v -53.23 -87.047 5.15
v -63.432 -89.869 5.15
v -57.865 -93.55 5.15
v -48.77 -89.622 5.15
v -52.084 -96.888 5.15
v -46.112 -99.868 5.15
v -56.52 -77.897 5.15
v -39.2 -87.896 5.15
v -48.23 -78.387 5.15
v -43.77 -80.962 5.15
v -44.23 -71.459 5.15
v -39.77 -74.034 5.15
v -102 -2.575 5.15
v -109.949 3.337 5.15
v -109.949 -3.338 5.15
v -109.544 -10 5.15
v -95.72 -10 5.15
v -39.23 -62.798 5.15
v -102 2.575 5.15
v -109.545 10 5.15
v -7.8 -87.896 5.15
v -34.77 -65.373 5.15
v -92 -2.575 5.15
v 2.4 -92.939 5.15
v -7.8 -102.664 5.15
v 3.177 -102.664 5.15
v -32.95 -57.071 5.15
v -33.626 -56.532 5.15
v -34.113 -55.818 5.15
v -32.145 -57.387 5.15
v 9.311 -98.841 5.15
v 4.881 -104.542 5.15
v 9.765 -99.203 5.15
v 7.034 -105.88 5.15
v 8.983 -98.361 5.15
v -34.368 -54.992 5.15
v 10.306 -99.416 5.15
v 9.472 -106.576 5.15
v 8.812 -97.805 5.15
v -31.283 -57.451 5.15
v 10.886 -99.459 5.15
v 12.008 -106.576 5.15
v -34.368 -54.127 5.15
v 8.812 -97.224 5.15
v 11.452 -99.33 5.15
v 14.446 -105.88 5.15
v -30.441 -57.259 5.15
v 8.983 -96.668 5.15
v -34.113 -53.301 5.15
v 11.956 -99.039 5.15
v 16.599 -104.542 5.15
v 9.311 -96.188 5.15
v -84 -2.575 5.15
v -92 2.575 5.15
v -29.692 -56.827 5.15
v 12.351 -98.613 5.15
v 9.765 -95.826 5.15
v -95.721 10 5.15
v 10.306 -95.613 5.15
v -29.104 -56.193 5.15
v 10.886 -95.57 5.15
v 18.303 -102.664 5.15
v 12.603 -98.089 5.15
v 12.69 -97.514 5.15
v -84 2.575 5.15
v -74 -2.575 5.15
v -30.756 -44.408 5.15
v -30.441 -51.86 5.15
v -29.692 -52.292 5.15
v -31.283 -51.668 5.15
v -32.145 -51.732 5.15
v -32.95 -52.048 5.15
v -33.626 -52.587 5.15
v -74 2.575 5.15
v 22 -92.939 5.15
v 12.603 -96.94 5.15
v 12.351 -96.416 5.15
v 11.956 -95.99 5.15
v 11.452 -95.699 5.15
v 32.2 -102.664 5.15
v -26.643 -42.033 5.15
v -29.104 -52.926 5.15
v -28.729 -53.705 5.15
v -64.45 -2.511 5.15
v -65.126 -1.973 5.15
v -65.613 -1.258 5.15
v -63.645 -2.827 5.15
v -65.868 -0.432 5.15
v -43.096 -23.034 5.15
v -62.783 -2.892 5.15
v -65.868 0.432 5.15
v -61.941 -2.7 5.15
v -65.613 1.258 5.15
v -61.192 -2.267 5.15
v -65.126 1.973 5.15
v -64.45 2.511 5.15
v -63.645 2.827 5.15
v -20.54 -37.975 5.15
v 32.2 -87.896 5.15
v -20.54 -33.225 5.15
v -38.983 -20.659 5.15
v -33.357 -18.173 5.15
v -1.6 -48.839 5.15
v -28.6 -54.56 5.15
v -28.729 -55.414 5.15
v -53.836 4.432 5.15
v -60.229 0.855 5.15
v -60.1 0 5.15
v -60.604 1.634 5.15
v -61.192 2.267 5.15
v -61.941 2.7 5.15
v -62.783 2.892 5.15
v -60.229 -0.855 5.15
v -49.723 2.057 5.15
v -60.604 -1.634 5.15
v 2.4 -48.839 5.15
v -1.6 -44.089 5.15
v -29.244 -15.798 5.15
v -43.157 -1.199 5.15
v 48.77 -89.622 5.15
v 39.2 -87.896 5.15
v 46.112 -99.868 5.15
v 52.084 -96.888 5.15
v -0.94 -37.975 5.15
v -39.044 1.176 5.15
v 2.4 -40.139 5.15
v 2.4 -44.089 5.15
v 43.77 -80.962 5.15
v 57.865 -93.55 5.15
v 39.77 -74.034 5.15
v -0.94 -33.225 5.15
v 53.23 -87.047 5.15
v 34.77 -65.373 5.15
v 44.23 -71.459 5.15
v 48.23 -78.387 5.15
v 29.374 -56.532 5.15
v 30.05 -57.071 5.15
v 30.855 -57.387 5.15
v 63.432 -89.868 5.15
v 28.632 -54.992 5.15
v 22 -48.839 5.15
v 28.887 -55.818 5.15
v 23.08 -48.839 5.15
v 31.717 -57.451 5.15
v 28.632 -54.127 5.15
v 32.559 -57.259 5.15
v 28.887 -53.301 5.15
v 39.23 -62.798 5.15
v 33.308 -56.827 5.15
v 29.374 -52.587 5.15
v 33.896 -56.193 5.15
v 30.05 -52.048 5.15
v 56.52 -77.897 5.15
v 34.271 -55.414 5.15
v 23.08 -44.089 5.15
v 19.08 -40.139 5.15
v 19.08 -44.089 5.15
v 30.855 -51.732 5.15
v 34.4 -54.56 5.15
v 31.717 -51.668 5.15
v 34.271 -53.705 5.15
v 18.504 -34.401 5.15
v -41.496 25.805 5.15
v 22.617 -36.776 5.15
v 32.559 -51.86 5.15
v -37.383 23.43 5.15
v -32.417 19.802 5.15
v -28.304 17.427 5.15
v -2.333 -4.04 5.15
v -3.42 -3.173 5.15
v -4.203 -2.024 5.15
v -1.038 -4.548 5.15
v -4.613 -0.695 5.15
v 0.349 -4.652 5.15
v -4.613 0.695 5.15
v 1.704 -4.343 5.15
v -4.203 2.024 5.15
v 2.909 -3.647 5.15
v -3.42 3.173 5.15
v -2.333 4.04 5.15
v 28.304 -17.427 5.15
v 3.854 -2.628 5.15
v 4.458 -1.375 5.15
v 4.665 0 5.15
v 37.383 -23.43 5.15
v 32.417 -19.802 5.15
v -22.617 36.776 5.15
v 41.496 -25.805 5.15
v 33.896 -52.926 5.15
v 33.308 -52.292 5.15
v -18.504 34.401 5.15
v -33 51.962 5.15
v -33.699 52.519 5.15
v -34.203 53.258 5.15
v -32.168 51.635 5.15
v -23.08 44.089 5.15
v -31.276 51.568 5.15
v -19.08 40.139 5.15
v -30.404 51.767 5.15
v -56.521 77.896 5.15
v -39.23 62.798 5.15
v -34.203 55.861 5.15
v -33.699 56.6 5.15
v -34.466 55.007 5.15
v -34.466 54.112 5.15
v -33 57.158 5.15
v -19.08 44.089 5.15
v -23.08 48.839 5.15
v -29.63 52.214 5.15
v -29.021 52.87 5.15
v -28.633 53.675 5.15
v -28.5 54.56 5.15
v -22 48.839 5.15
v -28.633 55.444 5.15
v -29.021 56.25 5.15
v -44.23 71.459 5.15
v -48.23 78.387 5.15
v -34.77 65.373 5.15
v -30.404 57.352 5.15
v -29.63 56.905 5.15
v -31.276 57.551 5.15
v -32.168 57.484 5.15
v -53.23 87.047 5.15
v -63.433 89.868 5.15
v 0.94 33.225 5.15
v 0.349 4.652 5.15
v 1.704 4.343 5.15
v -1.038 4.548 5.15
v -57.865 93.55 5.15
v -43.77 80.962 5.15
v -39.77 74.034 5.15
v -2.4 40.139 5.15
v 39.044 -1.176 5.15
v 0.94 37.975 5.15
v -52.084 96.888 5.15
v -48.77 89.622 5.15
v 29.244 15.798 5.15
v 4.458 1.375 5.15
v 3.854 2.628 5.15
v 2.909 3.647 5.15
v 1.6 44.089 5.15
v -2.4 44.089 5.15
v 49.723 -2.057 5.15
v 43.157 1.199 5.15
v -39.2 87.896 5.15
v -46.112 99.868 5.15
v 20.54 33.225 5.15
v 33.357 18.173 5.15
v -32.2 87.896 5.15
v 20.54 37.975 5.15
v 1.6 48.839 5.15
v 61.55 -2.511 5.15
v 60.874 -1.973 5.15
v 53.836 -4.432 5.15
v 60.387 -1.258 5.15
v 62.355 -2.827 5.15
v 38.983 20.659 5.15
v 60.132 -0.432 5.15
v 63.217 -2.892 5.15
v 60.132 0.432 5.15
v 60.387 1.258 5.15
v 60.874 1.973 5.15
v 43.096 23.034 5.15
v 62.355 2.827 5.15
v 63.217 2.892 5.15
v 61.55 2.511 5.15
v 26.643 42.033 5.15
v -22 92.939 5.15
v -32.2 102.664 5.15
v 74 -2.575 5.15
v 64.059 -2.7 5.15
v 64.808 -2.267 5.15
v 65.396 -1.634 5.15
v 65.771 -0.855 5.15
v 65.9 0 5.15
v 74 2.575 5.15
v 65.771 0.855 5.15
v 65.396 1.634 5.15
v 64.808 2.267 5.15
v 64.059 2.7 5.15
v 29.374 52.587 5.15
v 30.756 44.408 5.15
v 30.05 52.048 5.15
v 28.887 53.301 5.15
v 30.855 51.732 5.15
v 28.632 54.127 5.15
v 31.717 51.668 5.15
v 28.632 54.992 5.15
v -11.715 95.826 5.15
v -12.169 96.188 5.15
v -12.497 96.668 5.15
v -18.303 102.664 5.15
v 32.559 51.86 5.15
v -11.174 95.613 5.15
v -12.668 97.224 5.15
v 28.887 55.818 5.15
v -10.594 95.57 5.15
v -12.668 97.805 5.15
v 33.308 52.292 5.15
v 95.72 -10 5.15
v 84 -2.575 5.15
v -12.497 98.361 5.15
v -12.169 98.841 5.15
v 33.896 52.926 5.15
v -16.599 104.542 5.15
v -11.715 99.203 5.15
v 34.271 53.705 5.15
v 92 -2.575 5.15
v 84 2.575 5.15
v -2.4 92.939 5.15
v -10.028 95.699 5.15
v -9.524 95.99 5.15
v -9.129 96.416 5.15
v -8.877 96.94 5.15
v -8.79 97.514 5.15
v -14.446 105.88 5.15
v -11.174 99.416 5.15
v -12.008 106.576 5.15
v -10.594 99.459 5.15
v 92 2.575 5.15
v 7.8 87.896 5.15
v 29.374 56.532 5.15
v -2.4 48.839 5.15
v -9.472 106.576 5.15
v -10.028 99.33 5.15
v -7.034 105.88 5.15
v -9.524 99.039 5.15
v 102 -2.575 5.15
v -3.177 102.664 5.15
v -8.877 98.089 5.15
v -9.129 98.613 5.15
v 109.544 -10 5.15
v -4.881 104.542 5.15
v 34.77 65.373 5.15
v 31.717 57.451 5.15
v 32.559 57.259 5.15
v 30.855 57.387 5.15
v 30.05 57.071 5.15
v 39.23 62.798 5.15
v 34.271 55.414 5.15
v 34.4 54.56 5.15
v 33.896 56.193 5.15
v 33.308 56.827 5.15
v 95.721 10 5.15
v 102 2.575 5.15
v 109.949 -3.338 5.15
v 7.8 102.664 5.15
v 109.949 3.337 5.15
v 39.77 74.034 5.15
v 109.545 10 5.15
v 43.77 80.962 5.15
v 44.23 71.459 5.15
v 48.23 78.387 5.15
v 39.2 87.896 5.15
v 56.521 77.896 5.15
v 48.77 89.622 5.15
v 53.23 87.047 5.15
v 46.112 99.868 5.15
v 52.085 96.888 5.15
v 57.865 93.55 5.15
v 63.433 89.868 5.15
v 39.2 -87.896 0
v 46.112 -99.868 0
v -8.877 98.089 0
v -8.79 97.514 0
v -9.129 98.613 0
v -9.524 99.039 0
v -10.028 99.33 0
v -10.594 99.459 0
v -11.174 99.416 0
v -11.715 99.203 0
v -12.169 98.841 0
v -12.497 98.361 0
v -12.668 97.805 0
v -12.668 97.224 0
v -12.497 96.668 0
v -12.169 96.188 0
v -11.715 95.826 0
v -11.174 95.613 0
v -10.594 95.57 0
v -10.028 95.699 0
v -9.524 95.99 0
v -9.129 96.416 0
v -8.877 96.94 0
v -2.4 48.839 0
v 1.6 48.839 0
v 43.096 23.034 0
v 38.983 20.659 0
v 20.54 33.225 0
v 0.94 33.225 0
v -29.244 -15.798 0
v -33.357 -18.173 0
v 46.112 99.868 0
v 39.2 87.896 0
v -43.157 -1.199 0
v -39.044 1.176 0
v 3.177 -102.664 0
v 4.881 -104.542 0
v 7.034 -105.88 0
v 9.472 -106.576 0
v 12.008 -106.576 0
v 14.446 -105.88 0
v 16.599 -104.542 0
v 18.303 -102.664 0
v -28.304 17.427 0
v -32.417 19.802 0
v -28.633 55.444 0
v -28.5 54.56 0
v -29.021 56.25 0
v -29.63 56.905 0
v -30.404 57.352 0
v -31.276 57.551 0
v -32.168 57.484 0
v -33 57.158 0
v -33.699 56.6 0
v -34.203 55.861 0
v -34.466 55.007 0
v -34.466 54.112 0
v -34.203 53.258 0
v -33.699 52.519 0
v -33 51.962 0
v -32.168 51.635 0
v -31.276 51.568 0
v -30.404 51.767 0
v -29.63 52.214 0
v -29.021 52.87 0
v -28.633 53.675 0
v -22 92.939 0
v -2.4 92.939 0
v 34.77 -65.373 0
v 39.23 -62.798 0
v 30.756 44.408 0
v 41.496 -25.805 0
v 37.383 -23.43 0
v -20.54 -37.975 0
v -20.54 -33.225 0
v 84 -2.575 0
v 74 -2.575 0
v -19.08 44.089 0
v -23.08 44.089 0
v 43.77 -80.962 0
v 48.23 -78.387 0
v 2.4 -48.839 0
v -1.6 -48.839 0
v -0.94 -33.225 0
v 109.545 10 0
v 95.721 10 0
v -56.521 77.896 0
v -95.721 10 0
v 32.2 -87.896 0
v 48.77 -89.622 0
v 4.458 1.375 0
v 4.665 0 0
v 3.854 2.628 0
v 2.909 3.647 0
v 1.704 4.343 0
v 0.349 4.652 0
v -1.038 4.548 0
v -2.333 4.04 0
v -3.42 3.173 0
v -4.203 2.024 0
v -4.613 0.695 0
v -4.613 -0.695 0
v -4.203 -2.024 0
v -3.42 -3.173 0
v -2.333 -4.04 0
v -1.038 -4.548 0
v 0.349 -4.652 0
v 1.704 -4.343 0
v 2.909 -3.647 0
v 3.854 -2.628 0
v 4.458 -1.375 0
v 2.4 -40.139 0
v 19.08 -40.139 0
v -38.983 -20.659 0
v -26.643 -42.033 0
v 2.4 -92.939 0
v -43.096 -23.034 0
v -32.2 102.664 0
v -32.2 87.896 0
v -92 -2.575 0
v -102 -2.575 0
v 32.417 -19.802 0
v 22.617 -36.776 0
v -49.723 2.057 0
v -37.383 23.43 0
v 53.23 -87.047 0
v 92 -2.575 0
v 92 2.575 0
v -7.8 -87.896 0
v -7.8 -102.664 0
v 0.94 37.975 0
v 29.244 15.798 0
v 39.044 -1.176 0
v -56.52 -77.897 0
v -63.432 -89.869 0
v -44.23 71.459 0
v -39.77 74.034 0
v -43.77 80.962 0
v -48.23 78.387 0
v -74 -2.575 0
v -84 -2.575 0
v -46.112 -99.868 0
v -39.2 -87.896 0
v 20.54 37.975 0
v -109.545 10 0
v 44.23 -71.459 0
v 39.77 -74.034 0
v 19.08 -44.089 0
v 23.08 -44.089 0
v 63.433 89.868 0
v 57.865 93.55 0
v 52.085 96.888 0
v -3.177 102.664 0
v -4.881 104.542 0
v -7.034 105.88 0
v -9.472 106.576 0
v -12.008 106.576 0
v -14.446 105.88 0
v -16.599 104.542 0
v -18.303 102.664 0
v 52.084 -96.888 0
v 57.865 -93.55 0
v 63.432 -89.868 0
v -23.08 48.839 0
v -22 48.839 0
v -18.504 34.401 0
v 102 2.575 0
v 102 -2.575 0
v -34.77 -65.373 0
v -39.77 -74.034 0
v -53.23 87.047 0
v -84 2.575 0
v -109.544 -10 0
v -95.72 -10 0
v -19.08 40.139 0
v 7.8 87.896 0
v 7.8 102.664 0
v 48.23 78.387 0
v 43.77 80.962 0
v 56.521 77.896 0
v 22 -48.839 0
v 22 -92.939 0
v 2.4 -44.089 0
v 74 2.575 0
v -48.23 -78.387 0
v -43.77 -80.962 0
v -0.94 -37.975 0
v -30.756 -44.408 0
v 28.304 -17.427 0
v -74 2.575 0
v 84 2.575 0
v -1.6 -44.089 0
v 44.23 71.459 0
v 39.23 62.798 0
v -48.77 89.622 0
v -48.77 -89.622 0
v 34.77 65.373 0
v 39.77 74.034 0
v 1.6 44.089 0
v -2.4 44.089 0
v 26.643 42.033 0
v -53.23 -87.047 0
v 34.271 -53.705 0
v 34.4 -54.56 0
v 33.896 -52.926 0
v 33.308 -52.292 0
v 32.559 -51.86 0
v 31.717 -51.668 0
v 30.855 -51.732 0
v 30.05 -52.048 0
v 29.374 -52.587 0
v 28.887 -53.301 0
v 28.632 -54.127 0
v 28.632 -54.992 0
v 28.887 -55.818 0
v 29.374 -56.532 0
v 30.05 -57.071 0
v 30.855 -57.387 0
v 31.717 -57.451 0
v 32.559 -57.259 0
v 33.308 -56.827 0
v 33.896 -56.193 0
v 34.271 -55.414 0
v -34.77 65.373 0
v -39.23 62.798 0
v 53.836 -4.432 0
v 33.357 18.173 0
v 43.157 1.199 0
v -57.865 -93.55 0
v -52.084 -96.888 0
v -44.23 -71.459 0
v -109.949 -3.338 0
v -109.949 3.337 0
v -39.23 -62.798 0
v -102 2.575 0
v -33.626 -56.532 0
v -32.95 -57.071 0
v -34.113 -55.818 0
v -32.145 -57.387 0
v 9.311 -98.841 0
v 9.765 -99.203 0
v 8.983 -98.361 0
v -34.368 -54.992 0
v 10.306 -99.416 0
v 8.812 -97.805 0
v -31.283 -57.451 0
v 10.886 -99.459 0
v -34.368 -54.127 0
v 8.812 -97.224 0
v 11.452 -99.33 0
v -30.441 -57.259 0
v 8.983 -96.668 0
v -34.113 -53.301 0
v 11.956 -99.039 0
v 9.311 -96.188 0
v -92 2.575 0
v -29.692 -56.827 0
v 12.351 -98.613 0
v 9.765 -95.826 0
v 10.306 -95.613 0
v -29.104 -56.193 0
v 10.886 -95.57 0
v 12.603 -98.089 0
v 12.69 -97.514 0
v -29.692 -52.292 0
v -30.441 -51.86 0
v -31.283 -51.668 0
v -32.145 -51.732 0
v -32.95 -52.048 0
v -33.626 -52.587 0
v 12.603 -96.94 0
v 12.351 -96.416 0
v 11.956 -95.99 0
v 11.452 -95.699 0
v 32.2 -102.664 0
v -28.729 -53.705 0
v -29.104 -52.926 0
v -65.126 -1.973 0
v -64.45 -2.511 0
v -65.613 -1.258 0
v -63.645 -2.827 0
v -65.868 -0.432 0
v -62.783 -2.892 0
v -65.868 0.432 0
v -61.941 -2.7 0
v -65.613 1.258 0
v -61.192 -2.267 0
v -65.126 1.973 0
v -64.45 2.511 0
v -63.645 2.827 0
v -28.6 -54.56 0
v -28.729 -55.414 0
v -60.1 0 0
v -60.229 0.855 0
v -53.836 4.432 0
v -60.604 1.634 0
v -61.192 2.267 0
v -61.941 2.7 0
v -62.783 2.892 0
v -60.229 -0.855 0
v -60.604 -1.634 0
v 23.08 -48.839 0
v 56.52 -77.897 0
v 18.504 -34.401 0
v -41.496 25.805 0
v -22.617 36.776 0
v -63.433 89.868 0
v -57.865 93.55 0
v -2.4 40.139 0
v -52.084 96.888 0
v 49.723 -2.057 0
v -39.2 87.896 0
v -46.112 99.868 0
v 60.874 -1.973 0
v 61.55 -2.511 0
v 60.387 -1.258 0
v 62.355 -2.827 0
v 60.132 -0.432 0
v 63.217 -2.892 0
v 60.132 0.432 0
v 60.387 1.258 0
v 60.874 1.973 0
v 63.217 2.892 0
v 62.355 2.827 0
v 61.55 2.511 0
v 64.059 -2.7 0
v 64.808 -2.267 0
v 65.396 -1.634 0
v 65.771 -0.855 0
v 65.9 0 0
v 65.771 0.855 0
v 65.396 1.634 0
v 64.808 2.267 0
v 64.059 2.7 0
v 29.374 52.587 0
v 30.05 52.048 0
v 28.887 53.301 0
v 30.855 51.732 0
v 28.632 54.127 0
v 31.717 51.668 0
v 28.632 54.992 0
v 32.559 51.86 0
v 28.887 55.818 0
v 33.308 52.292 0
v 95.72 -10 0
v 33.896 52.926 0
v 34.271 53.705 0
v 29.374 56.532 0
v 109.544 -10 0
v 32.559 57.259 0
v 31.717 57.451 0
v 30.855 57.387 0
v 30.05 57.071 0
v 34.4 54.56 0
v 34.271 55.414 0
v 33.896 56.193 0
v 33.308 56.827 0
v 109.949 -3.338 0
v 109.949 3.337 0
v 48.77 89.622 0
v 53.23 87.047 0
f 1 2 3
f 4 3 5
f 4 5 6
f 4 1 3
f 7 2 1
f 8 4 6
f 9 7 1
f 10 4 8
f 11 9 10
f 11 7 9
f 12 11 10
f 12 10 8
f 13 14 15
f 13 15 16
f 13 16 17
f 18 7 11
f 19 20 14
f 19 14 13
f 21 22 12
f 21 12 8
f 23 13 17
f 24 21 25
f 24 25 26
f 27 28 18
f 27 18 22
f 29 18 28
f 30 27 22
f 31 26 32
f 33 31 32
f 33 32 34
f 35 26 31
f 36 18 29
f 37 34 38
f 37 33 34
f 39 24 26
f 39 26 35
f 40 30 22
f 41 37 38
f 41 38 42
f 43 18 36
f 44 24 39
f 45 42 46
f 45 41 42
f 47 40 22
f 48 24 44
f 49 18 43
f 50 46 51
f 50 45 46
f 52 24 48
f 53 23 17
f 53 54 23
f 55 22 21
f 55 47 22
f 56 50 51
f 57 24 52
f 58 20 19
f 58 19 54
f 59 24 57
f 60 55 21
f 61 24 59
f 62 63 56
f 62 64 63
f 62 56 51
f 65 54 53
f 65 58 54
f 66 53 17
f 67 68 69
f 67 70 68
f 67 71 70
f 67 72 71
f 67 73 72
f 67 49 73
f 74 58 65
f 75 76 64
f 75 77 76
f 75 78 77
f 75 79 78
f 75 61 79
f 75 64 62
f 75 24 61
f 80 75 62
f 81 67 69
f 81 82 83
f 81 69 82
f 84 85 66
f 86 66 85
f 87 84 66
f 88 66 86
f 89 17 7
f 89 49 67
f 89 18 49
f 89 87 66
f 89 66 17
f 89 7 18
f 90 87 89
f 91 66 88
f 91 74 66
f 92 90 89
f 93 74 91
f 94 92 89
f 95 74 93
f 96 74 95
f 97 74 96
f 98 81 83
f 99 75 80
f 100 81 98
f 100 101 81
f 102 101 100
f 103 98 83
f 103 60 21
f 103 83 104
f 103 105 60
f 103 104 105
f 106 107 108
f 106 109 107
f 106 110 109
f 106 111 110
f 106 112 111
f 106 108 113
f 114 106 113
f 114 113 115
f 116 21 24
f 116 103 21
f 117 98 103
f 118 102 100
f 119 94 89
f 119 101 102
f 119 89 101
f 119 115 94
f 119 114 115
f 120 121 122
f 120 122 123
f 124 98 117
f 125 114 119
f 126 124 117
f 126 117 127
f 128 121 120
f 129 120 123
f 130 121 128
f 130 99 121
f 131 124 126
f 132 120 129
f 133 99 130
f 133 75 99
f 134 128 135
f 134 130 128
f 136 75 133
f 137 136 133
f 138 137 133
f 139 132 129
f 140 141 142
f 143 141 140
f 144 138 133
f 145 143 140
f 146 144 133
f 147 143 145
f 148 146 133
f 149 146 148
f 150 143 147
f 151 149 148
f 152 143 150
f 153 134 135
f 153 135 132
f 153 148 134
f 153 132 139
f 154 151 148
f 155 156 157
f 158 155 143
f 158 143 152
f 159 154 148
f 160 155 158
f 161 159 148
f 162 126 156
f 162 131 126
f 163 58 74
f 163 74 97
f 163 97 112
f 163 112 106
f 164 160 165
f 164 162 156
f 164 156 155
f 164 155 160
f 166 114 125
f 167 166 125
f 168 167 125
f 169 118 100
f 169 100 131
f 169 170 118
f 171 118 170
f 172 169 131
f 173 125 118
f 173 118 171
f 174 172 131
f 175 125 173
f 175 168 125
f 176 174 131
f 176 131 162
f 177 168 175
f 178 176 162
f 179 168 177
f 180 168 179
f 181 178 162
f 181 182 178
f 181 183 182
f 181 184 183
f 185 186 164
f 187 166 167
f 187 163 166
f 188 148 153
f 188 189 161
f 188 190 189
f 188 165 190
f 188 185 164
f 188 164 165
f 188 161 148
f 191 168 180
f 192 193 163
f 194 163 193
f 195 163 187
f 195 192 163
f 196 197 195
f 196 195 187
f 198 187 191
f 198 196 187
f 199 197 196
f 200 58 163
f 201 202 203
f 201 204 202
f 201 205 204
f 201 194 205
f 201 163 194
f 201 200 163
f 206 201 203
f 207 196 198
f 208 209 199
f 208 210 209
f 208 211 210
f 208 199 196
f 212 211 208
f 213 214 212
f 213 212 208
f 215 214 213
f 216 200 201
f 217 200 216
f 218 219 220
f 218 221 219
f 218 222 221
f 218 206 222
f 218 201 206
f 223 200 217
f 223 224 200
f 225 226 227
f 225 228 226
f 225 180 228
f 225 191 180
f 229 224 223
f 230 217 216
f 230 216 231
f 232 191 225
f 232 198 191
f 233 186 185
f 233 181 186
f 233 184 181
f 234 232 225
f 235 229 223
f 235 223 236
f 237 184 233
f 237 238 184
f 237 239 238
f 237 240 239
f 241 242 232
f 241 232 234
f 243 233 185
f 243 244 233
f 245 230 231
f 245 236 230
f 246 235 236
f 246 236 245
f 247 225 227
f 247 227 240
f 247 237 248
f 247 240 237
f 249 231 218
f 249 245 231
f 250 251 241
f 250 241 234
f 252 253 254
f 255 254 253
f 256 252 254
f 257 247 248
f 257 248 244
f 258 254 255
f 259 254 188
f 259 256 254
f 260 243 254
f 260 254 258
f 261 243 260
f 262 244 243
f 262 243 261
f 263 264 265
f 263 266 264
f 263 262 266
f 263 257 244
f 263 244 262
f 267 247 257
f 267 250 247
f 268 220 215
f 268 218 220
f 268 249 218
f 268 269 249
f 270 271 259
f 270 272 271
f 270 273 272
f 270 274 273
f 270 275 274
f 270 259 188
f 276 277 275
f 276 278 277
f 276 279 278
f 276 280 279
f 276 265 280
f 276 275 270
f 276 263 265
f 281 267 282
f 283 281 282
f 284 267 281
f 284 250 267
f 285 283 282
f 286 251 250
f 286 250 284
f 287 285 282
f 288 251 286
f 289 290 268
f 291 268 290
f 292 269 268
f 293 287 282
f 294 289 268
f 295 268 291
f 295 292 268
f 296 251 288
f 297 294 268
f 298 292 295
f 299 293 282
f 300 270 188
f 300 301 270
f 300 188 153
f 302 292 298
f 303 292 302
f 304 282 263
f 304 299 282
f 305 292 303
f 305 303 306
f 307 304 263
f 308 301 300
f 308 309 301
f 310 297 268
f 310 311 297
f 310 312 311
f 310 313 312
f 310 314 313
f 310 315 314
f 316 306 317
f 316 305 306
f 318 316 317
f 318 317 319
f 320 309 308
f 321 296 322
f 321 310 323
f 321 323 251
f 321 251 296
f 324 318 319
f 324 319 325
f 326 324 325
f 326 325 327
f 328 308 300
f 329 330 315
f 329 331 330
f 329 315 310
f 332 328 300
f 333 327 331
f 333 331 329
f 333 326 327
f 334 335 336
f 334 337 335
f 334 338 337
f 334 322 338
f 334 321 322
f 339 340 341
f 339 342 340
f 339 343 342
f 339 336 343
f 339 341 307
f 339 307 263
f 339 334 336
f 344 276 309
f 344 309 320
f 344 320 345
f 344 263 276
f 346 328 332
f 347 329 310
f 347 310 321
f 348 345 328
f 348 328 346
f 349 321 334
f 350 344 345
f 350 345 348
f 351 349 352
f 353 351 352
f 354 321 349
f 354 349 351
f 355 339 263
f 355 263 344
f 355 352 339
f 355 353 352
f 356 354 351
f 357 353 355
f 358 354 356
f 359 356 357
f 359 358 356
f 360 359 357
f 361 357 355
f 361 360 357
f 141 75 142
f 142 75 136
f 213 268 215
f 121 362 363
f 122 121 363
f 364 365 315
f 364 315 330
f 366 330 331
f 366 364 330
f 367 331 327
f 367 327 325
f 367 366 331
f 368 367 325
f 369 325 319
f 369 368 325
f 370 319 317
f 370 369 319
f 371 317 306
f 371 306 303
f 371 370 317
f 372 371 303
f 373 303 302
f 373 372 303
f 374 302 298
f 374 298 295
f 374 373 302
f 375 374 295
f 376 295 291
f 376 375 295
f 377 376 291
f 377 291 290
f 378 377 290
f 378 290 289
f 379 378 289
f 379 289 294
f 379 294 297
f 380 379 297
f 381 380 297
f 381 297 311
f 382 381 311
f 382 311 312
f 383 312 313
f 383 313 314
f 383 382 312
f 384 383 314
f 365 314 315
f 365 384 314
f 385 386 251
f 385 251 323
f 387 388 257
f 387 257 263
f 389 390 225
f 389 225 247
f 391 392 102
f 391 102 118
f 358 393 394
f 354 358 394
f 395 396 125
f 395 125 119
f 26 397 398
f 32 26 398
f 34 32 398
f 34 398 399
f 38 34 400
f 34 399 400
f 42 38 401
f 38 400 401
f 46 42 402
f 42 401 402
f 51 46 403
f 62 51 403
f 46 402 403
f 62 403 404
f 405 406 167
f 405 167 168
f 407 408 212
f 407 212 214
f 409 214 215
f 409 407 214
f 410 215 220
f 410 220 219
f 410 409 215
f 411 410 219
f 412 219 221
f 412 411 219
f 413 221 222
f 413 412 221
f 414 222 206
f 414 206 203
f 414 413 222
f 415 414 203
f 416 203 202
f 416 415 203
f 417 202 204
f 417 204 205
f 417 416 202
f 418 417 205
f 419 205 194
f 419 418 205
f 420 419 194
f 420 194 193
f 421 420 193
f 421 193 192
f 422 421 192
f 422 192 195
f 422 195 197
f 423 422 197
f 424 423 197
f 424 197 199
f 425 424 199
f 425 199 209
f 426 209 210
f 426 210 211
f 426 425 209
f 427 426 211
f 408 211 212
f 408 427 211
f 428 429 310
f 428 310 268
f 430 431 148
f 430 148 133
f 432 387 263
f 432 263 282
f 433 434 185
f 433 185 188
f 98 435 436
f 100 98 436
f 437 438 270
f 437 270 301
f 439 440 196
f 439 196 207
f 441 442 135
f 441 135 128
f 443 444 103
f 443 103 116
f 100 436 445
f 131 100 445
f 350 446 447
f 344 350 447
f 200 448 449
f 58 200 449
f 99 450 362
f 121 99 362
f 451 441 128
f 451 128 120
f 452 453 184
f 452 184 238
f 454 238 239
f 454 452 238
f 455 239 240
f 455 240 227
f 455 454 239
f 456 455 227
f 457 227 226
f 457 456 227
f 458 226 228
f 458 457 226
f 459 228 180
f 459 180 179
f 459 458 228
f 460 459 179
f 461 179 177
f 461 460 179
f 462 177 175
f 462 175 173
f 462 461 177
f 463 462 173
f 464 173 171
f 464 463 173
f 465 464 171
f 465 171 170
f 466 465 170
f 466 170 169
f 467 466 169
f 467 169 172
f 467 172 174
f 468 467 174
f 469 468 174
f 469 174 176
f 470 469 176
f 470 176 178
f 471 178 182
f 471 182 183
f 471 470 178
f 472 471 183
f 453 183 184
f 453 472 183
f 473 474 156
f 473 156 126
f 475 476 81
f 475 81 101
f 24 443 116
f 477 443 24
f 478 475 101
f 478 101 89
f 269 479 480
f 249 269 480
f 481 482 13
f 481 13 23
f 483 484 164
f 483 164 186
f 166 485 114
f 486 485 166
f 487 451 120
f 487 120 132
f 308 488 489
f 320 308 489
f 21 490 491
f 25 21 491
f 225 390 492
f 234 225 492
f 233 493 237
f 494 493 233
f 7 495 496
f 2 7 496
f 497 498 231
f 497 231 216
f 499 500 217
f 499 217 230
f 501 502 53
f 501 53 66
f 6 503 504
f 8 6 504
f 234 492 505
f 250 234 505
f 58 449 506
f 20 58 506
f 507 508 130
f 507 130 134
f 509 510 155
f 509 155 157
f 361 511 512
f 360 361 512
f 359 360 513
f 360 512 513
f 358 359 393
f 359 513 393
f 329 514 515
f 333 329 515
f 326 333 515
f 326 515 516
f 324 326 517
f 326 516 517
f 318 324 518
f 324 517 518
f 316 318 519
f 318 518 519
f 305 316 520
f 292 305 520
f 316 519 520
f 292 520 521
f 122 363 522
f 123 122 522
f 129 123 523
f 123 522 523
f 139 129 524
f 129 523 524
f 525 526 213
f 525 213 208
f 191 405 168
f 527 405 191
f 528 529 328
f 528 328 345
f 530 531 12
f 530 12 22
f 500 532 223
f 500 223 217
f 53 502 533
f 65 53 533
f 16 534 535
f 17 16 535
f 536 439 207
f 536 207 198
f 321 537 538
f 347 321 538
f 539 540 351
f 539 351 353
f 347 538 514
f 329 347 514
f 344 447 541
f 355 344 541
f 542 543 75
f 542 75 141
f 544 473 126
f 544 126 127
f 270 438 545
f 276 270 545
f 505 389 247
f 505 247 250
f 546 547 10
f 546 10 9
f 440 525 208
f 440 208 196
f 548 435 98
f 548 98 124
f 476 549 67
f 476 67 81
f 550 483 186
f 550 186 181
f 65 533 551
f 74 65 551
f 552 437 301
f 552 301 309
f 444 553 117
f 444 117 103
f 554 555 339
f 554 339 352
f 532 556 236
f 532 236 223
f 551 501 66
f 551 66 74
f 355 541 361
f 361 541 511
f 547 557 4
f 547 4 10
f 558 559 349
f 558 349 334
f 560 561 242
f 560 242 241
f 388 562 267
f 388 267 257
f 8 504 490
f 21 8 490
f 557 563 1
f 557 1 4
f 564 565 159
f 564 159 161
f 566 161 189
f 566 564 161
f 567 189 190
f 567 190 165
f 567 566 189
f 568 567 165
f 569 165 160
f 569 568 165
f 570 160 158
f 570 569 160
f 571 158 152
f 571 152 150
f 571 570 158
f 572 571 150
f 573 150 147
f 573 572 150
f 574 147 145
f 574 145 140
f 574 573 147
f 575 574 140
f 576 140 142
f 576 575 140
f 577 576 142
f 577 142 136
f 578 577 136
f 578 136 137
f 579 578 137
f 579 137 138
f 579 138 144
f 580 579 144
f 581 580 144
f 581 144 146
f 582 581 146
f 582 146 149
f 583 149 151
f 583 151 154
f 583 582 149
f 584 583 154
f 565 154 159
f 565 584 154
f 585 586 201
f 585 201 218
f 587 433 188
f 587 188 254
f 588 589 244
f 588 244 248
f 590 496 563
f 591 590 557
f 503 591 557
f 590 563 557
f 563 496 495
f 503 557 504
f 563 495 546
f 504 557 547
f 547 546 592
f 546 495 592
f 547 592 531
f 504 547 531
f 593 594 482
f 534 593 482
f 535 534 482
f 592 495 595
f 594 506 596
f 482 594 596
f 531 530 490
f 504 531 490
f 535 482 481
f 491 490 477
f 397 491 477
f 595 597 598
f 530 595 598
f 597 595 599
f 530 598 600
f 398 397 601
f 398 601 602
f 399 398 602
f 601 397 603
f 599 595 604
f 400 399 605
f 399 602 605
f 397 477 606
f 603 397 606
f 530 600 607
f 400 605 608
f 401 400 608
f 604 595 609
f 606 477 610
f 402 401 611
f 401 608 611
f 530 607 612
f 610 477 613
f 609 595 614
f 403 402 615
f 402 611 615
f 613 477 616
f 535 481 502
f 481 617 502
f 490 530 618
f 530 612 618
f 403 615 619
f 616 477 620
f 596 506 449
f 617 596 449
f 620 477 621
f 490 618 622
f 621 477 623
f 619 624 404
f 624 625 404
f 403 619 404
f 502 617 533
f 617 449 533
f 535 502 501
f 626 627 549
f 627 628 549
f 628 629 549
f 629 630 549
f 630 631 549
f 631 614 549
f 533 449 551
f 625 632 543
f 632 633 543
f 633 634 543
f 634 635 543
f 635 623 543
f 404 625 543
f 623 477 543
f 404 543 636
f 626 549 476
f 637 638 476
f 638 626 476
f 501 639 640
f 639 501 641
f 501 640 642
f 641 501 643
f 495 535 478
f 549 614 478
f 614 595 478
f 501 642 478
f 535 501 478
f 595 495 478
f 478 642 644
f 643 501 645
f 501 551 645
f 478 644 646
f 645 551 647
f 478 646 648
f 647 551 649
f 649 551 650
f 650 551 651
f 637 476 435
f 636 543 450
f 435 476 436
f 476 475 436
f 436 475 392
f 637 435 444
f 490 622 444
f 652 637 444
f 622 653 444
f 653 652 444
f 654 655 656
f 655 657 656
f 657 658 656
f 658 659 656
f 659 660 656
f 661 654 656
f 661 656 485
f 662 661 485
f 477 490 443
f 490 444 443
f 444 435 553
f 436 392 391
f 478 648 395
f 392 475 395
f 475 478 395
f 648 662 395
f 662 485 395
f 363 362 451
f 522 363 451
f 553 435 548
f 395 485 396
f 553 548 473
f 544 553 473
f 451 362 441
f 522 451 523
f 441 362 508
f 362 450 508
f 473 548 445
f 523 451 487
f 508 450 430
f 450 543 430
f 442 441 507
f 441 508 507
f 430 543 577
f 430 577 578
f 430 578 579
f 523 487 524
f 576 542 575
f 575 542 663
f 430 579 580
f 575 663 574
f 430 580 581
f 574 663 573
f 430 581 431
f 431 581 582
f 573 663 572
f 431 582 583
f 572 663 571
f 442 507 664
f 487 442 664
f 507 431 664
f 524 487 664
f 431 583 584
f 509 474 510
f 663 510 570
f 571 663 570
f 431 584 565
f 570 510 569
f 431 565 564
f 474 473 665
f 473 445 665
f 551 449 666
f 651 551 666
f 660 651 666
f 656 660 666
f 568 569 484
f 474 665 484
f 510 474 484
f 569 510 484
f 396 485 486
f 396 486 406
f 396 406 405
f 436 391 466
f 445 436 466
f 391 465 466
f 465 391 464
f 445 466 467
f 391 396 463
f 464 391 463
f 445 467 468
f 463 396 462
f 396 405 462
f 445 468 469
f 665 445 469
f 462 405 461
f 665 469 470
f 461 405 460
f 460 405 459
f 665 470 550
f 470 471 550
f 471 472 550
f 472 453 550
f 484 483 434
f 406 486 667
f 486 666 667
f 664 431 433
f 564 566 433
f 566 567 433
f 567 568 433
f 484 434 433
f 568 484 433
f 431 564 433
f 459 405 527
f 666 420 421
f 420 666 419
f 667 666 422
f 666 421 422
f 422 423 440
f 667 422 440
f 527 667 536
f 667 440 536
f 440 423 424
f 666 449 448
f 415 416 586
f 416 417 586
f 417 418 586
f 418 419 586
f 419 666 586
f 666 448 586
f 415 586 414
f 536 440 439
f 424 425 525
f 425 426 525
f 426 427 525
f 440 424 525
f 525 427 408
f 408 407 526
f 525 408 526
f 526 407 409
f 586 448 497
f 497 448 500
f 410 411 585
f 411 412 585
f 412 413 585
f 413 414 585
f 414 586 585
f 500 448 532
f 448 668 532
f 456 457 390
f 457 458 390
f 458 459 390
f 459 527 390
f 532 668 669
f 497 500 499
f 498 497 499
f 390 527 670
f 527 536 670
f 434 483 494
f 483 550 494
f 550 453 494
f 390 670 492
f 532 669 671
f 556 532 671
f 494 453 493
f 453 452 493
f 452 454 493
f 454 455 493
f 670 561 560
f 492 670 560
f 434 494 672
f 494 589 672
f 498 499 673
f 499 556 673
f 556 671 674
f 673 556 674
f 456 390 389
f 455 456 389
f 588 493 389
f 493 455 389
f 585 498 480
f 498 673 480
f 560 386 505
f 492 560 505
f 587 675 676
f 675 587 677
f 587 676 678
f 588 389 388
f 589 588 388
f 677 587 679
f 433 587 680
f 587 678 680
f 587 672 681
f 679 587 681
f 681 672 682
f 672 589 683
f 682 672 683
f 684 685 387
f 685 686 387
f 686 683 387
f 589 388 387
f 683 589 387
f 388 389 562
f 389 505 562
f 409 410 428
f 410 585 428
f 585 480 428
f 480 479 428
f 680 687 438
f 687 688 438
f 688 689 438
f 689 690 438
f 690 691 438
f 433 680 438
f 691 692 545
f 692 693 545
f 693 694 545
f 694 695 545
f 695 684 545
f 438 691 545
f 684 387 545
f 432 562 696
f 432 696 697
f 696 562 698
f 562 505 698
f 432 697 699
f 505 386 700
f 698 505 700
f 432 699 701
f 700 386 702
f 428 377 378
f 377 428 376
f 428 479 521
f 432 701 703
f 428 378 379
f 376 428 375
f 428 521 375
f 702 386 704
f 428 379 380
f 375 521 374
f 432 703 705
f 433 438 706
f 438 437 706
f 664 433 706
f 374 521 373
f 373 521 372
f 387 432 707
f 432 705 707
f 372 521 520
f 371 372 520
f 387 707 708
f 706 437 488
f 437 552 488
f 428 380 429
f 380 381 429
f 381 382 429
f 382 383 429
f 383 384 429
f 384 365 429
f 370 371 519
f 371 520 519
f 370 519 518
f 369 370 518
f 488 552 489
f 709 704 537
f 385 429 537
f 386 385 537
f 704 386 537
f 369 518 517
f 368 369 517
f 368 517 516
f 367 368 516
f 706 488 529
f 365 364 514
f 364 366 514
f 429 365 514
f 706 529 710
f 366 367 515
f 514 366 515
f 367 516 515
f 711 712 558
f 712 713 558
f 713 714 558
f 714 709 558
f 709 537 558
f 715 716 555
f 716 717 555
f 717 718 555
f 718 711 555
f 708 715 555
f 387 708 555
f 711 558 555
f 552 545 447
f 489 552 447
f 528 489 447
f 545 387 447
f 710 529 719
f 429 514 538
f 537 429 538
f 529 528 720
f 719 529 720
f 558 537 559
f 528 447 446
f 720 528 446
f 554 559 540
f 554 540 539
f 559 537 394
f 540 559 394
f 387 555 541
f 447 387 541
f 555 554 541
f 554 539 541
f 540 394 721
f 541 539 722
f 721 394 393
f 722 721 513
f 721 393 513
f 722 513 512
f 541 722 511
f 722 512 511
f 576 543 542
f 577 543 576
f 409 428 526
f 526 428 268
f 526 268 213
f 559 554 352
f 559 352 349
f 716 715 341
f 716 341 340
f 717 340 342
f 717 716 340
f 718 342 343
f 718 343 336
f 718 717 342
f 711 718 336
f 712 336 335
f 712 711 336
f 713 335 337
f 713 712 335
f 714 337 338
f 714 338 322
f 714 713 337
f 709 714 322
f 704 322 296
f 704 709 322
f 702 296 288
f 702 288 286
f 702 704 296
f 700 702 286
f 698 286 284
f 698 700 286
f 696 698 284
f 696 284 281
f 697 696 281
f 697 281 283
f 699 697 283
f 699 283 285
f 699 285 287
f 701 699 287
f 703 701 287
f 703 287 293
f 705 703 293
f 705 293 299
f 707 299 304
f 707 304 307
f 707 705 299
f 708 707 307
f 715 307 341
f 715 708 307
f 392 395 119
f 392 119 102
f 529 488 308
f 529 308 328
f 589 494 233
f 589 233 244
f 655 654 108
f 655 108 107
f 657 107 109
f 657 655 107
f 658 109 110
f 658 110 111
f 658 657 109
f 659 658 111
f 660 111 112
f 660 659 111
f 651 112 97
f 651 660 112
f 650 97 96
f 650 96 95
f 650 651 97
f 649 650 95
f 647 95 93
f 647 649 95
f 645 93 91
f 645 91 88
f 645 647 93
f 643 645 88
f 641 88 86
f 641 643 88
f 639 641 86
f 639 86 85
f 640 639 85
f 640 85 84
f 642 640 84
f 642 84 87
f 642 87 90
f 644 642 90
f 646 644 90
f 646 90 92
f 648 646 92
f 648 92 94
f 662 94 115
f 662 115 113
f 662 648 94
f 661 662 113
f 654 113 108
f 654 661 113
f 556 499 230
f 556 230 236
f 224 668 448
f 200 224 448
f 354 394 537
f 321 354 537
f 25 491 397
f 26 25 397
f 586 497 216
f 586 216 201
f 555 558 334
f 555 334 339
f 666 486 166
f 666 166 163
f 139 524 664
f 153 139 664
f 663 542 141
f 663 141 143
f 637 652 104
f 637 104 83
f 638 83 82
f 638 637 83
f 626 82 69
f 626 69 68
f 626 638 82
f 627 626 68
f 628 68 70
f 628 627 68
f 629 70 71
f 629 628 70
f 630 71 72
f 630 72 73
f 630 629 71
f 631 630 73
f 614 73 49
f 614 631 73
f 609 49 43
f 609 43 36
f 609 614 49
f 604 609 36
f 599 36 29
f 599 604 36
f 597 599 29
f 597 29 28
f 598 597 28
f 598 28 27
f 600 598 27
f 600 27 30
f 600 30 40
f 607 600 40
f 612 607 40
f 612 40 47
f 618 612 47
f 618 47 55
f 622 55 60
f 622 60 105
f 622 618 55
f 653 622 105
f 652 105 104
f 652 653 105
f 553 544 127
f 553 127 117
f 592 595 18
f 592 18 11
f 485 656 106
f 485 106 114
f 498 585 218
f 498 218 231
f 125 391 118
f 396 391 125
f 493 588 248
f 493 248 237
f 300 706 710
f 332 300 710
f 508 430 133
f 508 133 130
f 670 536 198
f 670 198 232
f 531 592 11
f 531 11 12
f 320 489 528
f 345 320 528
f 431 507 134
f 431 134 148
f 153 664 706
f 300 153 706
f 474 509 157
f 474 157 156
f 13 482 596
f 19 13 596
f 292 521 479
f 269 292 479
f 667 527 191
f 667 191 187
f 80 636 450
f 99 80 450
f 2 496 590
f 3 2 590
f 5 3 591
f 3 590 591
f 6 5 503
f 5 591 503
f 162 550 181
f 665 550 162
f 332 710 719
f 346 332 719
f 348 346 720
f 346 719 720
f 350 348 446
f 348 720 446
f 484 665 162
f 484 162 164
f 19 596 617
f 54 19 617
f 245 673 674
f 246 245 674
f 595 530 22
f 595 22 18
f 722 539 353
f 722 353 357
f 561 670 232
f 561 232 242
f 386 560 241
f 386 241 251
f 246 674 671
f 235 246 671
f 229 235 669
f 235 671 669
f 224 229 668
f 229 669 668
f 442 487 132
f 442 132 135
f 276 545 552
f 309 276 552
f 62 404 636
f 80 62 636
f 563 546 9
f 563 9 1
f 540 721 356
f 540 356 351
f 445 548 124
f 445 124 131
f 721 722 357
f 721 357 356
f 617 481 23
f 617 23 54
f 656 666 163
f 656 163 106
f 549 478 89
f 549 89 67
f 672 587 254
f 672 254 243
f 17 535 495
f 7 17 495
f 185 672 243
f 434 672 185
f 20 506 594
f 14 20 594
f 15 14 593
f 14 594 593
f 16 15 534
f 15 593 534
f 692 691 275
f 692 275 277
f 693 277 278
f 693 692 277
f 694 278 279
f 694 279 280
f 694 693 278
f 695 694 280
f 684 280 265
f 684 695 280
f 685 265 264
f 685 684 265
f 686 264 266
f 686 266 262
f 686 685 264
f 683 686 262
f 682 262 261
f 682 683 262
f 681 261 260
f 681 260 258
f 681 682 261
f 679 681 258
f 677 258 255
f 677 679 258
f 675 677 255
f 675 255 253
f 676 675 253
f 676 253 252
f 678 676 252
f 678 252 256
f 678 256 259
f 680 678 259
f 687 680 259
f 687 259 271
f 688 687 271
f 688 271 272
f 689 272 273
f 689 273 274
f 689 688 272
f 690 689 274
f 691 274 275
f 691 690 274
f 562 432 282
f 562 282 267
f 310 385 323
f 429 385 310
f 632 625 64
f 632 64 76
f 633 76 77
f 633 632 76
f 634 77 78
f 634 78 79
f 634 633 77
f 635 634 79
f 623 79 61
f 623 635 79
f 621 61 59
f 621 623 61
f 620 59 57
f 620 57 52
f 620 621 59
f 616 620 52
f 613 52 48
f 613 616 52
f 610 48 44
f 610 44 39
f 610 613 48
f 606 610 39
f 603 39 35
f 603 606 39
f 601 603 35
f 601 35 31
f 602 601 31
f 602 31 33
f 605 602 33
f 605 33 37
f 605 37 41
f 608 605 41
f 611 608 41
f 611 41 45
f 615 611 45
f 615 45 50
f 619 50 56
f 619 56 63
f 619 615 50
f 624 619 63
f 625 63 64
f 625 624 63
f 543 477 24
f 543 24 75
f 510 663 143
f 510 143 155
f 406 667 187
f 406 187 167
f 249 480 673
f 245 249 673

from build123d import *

# Parameters (mm, degrees)
MODEL_R             = 2.9
MODEL_R_2           = 3
MODEL_R_3           = 4.665
MODEL_R_4           = 1.95
MODEL_W             = 10
MODEL_H             = 5.15
MODEL_W_2           = 19.6
MODEL_H_2           = 4.75
BOSS_EXTRUDE1_DEPTH = 5.15


with BuildPart() as part:
    # Model → Boss-Extrude1 (new body)
    with BuildSketch(Plane.XY):
        with BuildLine():
            Line((-56.520735382, 77.896206612), (-95.720735382, 9.999814955))
            Line((-95.720735382, 9.999814955), (-109.544528393, 9.999814955))
            ThreePointArc((-109.544528393, 9.999814955), (-110, -0.000331846), (-109.544468057, -10.000475899))
            Line((-109.544468057, -10.000475899), (-95.72019722, -10.000475899))
            Line((-95.72019722, -10.000475899), (-56.52019722, -77.896867556))
            Line((-56.52019722, -77.896867556), (-63.432093724, -89.868623478))
            ThreePointArc((-63.432093724, -89.868623478), (-54.999779481, -95.262921733), (-46.112001713, -99.868329805))
            Line((-46.112001713, -99.868329805), (-39.2, -87.896391657))
            Line((-39.2, -87.896391657), (-7.8, -87.896391657))
            Line((-7.8, -87.896391657), (-7.8, -102.664454178))
            Line((-7.8, -102.664454178), (3.176931839, -102.664454178))
            ThreePointArc((3.176931839, -102.664454178), (10.74, -106.664454178), (18.303068161, -102.664454178))
            Line((18.303068161, -102.664454178), (32.2, -102.664454178))
            Line((32.2, -102.664454178), (32.2, -87.896391657))
            Line((32.2, -87.896391657), (39.2, -87.896391657))
            Line((39.2, -87.896391657), (46.112001713, -99.868329805))
            ThreePointArc((46.112001713, -99.868329805), (54.999874175, -95.262867061), (63.432272389, -89.86849737))
            Line((63.432272389, -89.86849737), (56.520280769, -77.896576702))
            Line((56.520280769, -77.896576702), (95.720280769, -10.000185045))
            Line((95.720280769, -10.000185045), (109.544494609, -10.000185045))
            ThreePointArc((109.544494609, -10.000185045), (109.999999999, -0.000331846), (109.544554943, 9.999524101))
            Line((109.544554943, 9.999524101), (95.720818931, 9.999524101))
            Line((95.720818931, 9.999524101), (56.520818931, 77.895915758))
            Line((56.520818931, 77.895915758), (63.432925851, 89.868036131))
            ThreePointArc((63.432925851, 89.868036131), (55.000220519, 95.262667099), (46.112001713, 99.868329805))
            Line((46.112001713, 99.868329805), (39.2, 87.896391657))
            Line((39.2, 87.896391657), (7.8, 87.896391657))
            Line((7.8, 87.896391657), (7.8, 102.664454178))
            Line((7.8, 102.664454178), (-3.176931839, 102.664454178))
            ThreePointArc((-3.176931839, 102.664454178), (-10.74, 106.664454178), (-18.303068161, 102.664454178))
            Line((-18.303068161, 102.664454178), (-32.2, 102.664454178))
            Line((-32.2, 102.664454178), (-32.2, 87.896391657))
            Line((-32.2, 87.896391657), (-39.2, 87.896391657))
            Line((-39.2, 87.896391657), (-46.112001713, 99.868329805))
            ThreePointArc((-46.112001713, 99.868329805), (-55.000125824, 95.262721771), (-63.432747187, 89.86816224))
            Line((-63.432747187, 89.86816224), (-56.520735382, 77.896206612))
        make_face()
        with Locations((-63, 0)):
            Circle(MODEL_R, mode=Mode.SUBTRACT)
        with Locations((-31.5, -54.559600438)):
            Circle(MODEL_R, mode=Mode.SUBTRACT)
        with Locations((31.5, -54.559600438)):
            Circle(MODEL_R, mode=Mode.SUBTRACT)
        with Locations((63, 0)):
            Circle(MODEL_R, mode=Mode.SUBTRACT)
        with Locations((31.5, 54.559600438)):
            Circle(MODEL_R, mode=Mode.SUBTRACT)
        with Locations((-31.5, 54.559600438)):
            Circle(MODEL_R_2, mode=Mode.SUBTRACT)
        Circle(MODEL_R_3, mode=Mode.SUBTRACT)
        with Locations((10.74, -97.514454178)):
            Circle(MODEL_R_4, mode=Mode.SUBTRACT)
        with Locations((-10.74, 97.514454177)):
            Circle(MODEL_R_4, mode=Mode.SUBTRACT)
        with Locations((79, 0)):
            Rectangle(MODEL_W, MODEL_H, mode=Mode.SUBTRACT)
        with Locations((97, 0)):
            Rectangle(MODEL_W, MODEL_H, mode=Mode.SUBTRACT)
        Polygon((34.769984585, 65.37337988), (39.230015415, 62.79837988), (44.230015415, 71.458633918), (39.769984585, 74.033633918), align=None, mode=Mode.SUBTRACT)
        Polygon((43.769984585, 80.961837148), (48.230015415, 78.386837148), (53.230015415, 87.047091186), (48.769984585, 89.622091186), align=None, mode=Mode.SUBTRACT)
        Polygon((-48.230015415, 78.386837148), (-43.769984585, 80.961837148), (-48.769984585, 89.622091186), (-53.230015415, 87.047091186), align=None, mode=Mode.SUBTRACT)
        Polygon((-39.230015415, 62.79837988), (-34.769984585, 65.37337988), (-39.769984585, 74.033633918), (-44.230015415, 71.458633918), align=None, mode=Mode.SUBTRACT)
        with Locations((-79, 0)):
            Rectangle(MODEL_W, MODEL_H, mode=Mode.SUBTRACT)
        with Locations((-97, 0)):
            Rectangle(MODEL_W, MODEL_H, mode=Mode.SUBTRACT)
        Polygon((-34.769984585, -65.37337988), (-39.230015415, -62.79837988), (-44.230015415, -71.458633918), (-39.769984585, -74.033633918), align=None, mode=Mode.SUBTRACT)
        Polygon((-43.769984585, -80.961837148), (-48.230015415, -78.386837148), (-53.230015415, -87.047091186), (-48.769984585, -89.622091186), align=None, mode=Mode.SUBTRACT)
        Polygon((39.230015415, -62.79837988), (34.769984585, -65.37337988), (39.769984585, -74.033633918), (44.230015415, -71.458633918), align=None, mode=Mode.SUBTRACT)
        Polygon((48.230015415, -78.386837148), (43.769984585, -80.961837148), (48.769984585, -89.622091186), (53.230015415, -87.047091186), align=None, mode=Mode.SUBTRACT)
        Polygon((33.357314709, 18.17343612), (29.243694041, 15.79843612), (39.043694041, -1.175661794), (43.157314709, 1.199338206), align=None, mode=Mode.SUBTRACT)
        Polygon((32.417314709, -19.80156388), (28.303694041, -17.42656388), (18.503694041, -34.400661794), (22.617314709, -36.775661794), align=None, mode=Mode.SUBTRACT)
        with Locations((-10.74, -35.6)):
            Rectangle(MODEL_W_2, MODEL_H_2, mode=Mode.SUBTRACT)
        Polygon((-33.357314709, -18.17343612), (-29.243694041, -15.79843612), (-39.043694041, 1.175661794), (-43.157314709, -1.199338206), align=None, mode=Mode.SUBTRACT)
        Polygon((-32.417314709, 19.80156388), (-28.303694041, 17.42656388), (-18.503694041, 34.400661794), (-22.617314709, 36.775661794), align=None, mode=Mode.SUBTRACT)
        Polygon((38.982587357, 20.659086443), (43.096208025, 23.034086443), (30.756208025, 44.407593408), (26.642587357, 42.032593408), align=None, mode=Mode.SUBTRACT)
        Polygon((37.382587357, -23.430367735), (41.496208025, -25.805367735), (53.836208025, -4.431860769), (49.722587357, -2.056860769), align=None, mode=Mode.SUBTRACT)
        Polygon((2.4, -44.089454178), (-1.6, -44.089454178), (-1.6, -48.839454177), (2.4, -48.839454177), (2.4, -92.939454178), (22, -92.939454178), (22, -48.839454177), (23.08, -48.839454177), (23.08, -44.089454178), (19.08, -44.089454178), (19.08, -40.139454177), (2.4, -40.139454177), align=None, mode=Mode.SUBTRACT)
        Polygon((-38.982587357, -20.659086443), (-43.096208025, -23.034086443), (-30.756208025, -44.407593408), (-26.642587357, -42.032593408), align=None, mode=Mode.SUBTRACT)
        Polygon((-37.382587357, 23.430367735), (-41.496208025, 25.805367735), (-53.836208025, 4.431860769), (-49.722587357, 2.056860769), align=None, mode=Mode.SUBTRACT)
        with Locations((10.74, 35.6)):
            Rectangle(MODEL_W_2, MODEL_H_2, mode=Mode.SUBTRACT)
        Polygon((-2.4, 44.089454178), (1.6, 44.089454178), (1.6, 48.839454177), (-2.4, 48.839454177), (-2.4, 92.939454178), (-22, 92.939454178), (-22, 48.839454177), (-23.08, 48.839454177), (-23.08, 44.089454178), (-19.08, 44.089454178), (-19.08, 40.139454177), (-2.4, 40.139454177), align=None, mode=Mode.SUBTRACT)
    extrude(amount=BOSS_EXTRUDE1_DEPTH)


solid = part.part
